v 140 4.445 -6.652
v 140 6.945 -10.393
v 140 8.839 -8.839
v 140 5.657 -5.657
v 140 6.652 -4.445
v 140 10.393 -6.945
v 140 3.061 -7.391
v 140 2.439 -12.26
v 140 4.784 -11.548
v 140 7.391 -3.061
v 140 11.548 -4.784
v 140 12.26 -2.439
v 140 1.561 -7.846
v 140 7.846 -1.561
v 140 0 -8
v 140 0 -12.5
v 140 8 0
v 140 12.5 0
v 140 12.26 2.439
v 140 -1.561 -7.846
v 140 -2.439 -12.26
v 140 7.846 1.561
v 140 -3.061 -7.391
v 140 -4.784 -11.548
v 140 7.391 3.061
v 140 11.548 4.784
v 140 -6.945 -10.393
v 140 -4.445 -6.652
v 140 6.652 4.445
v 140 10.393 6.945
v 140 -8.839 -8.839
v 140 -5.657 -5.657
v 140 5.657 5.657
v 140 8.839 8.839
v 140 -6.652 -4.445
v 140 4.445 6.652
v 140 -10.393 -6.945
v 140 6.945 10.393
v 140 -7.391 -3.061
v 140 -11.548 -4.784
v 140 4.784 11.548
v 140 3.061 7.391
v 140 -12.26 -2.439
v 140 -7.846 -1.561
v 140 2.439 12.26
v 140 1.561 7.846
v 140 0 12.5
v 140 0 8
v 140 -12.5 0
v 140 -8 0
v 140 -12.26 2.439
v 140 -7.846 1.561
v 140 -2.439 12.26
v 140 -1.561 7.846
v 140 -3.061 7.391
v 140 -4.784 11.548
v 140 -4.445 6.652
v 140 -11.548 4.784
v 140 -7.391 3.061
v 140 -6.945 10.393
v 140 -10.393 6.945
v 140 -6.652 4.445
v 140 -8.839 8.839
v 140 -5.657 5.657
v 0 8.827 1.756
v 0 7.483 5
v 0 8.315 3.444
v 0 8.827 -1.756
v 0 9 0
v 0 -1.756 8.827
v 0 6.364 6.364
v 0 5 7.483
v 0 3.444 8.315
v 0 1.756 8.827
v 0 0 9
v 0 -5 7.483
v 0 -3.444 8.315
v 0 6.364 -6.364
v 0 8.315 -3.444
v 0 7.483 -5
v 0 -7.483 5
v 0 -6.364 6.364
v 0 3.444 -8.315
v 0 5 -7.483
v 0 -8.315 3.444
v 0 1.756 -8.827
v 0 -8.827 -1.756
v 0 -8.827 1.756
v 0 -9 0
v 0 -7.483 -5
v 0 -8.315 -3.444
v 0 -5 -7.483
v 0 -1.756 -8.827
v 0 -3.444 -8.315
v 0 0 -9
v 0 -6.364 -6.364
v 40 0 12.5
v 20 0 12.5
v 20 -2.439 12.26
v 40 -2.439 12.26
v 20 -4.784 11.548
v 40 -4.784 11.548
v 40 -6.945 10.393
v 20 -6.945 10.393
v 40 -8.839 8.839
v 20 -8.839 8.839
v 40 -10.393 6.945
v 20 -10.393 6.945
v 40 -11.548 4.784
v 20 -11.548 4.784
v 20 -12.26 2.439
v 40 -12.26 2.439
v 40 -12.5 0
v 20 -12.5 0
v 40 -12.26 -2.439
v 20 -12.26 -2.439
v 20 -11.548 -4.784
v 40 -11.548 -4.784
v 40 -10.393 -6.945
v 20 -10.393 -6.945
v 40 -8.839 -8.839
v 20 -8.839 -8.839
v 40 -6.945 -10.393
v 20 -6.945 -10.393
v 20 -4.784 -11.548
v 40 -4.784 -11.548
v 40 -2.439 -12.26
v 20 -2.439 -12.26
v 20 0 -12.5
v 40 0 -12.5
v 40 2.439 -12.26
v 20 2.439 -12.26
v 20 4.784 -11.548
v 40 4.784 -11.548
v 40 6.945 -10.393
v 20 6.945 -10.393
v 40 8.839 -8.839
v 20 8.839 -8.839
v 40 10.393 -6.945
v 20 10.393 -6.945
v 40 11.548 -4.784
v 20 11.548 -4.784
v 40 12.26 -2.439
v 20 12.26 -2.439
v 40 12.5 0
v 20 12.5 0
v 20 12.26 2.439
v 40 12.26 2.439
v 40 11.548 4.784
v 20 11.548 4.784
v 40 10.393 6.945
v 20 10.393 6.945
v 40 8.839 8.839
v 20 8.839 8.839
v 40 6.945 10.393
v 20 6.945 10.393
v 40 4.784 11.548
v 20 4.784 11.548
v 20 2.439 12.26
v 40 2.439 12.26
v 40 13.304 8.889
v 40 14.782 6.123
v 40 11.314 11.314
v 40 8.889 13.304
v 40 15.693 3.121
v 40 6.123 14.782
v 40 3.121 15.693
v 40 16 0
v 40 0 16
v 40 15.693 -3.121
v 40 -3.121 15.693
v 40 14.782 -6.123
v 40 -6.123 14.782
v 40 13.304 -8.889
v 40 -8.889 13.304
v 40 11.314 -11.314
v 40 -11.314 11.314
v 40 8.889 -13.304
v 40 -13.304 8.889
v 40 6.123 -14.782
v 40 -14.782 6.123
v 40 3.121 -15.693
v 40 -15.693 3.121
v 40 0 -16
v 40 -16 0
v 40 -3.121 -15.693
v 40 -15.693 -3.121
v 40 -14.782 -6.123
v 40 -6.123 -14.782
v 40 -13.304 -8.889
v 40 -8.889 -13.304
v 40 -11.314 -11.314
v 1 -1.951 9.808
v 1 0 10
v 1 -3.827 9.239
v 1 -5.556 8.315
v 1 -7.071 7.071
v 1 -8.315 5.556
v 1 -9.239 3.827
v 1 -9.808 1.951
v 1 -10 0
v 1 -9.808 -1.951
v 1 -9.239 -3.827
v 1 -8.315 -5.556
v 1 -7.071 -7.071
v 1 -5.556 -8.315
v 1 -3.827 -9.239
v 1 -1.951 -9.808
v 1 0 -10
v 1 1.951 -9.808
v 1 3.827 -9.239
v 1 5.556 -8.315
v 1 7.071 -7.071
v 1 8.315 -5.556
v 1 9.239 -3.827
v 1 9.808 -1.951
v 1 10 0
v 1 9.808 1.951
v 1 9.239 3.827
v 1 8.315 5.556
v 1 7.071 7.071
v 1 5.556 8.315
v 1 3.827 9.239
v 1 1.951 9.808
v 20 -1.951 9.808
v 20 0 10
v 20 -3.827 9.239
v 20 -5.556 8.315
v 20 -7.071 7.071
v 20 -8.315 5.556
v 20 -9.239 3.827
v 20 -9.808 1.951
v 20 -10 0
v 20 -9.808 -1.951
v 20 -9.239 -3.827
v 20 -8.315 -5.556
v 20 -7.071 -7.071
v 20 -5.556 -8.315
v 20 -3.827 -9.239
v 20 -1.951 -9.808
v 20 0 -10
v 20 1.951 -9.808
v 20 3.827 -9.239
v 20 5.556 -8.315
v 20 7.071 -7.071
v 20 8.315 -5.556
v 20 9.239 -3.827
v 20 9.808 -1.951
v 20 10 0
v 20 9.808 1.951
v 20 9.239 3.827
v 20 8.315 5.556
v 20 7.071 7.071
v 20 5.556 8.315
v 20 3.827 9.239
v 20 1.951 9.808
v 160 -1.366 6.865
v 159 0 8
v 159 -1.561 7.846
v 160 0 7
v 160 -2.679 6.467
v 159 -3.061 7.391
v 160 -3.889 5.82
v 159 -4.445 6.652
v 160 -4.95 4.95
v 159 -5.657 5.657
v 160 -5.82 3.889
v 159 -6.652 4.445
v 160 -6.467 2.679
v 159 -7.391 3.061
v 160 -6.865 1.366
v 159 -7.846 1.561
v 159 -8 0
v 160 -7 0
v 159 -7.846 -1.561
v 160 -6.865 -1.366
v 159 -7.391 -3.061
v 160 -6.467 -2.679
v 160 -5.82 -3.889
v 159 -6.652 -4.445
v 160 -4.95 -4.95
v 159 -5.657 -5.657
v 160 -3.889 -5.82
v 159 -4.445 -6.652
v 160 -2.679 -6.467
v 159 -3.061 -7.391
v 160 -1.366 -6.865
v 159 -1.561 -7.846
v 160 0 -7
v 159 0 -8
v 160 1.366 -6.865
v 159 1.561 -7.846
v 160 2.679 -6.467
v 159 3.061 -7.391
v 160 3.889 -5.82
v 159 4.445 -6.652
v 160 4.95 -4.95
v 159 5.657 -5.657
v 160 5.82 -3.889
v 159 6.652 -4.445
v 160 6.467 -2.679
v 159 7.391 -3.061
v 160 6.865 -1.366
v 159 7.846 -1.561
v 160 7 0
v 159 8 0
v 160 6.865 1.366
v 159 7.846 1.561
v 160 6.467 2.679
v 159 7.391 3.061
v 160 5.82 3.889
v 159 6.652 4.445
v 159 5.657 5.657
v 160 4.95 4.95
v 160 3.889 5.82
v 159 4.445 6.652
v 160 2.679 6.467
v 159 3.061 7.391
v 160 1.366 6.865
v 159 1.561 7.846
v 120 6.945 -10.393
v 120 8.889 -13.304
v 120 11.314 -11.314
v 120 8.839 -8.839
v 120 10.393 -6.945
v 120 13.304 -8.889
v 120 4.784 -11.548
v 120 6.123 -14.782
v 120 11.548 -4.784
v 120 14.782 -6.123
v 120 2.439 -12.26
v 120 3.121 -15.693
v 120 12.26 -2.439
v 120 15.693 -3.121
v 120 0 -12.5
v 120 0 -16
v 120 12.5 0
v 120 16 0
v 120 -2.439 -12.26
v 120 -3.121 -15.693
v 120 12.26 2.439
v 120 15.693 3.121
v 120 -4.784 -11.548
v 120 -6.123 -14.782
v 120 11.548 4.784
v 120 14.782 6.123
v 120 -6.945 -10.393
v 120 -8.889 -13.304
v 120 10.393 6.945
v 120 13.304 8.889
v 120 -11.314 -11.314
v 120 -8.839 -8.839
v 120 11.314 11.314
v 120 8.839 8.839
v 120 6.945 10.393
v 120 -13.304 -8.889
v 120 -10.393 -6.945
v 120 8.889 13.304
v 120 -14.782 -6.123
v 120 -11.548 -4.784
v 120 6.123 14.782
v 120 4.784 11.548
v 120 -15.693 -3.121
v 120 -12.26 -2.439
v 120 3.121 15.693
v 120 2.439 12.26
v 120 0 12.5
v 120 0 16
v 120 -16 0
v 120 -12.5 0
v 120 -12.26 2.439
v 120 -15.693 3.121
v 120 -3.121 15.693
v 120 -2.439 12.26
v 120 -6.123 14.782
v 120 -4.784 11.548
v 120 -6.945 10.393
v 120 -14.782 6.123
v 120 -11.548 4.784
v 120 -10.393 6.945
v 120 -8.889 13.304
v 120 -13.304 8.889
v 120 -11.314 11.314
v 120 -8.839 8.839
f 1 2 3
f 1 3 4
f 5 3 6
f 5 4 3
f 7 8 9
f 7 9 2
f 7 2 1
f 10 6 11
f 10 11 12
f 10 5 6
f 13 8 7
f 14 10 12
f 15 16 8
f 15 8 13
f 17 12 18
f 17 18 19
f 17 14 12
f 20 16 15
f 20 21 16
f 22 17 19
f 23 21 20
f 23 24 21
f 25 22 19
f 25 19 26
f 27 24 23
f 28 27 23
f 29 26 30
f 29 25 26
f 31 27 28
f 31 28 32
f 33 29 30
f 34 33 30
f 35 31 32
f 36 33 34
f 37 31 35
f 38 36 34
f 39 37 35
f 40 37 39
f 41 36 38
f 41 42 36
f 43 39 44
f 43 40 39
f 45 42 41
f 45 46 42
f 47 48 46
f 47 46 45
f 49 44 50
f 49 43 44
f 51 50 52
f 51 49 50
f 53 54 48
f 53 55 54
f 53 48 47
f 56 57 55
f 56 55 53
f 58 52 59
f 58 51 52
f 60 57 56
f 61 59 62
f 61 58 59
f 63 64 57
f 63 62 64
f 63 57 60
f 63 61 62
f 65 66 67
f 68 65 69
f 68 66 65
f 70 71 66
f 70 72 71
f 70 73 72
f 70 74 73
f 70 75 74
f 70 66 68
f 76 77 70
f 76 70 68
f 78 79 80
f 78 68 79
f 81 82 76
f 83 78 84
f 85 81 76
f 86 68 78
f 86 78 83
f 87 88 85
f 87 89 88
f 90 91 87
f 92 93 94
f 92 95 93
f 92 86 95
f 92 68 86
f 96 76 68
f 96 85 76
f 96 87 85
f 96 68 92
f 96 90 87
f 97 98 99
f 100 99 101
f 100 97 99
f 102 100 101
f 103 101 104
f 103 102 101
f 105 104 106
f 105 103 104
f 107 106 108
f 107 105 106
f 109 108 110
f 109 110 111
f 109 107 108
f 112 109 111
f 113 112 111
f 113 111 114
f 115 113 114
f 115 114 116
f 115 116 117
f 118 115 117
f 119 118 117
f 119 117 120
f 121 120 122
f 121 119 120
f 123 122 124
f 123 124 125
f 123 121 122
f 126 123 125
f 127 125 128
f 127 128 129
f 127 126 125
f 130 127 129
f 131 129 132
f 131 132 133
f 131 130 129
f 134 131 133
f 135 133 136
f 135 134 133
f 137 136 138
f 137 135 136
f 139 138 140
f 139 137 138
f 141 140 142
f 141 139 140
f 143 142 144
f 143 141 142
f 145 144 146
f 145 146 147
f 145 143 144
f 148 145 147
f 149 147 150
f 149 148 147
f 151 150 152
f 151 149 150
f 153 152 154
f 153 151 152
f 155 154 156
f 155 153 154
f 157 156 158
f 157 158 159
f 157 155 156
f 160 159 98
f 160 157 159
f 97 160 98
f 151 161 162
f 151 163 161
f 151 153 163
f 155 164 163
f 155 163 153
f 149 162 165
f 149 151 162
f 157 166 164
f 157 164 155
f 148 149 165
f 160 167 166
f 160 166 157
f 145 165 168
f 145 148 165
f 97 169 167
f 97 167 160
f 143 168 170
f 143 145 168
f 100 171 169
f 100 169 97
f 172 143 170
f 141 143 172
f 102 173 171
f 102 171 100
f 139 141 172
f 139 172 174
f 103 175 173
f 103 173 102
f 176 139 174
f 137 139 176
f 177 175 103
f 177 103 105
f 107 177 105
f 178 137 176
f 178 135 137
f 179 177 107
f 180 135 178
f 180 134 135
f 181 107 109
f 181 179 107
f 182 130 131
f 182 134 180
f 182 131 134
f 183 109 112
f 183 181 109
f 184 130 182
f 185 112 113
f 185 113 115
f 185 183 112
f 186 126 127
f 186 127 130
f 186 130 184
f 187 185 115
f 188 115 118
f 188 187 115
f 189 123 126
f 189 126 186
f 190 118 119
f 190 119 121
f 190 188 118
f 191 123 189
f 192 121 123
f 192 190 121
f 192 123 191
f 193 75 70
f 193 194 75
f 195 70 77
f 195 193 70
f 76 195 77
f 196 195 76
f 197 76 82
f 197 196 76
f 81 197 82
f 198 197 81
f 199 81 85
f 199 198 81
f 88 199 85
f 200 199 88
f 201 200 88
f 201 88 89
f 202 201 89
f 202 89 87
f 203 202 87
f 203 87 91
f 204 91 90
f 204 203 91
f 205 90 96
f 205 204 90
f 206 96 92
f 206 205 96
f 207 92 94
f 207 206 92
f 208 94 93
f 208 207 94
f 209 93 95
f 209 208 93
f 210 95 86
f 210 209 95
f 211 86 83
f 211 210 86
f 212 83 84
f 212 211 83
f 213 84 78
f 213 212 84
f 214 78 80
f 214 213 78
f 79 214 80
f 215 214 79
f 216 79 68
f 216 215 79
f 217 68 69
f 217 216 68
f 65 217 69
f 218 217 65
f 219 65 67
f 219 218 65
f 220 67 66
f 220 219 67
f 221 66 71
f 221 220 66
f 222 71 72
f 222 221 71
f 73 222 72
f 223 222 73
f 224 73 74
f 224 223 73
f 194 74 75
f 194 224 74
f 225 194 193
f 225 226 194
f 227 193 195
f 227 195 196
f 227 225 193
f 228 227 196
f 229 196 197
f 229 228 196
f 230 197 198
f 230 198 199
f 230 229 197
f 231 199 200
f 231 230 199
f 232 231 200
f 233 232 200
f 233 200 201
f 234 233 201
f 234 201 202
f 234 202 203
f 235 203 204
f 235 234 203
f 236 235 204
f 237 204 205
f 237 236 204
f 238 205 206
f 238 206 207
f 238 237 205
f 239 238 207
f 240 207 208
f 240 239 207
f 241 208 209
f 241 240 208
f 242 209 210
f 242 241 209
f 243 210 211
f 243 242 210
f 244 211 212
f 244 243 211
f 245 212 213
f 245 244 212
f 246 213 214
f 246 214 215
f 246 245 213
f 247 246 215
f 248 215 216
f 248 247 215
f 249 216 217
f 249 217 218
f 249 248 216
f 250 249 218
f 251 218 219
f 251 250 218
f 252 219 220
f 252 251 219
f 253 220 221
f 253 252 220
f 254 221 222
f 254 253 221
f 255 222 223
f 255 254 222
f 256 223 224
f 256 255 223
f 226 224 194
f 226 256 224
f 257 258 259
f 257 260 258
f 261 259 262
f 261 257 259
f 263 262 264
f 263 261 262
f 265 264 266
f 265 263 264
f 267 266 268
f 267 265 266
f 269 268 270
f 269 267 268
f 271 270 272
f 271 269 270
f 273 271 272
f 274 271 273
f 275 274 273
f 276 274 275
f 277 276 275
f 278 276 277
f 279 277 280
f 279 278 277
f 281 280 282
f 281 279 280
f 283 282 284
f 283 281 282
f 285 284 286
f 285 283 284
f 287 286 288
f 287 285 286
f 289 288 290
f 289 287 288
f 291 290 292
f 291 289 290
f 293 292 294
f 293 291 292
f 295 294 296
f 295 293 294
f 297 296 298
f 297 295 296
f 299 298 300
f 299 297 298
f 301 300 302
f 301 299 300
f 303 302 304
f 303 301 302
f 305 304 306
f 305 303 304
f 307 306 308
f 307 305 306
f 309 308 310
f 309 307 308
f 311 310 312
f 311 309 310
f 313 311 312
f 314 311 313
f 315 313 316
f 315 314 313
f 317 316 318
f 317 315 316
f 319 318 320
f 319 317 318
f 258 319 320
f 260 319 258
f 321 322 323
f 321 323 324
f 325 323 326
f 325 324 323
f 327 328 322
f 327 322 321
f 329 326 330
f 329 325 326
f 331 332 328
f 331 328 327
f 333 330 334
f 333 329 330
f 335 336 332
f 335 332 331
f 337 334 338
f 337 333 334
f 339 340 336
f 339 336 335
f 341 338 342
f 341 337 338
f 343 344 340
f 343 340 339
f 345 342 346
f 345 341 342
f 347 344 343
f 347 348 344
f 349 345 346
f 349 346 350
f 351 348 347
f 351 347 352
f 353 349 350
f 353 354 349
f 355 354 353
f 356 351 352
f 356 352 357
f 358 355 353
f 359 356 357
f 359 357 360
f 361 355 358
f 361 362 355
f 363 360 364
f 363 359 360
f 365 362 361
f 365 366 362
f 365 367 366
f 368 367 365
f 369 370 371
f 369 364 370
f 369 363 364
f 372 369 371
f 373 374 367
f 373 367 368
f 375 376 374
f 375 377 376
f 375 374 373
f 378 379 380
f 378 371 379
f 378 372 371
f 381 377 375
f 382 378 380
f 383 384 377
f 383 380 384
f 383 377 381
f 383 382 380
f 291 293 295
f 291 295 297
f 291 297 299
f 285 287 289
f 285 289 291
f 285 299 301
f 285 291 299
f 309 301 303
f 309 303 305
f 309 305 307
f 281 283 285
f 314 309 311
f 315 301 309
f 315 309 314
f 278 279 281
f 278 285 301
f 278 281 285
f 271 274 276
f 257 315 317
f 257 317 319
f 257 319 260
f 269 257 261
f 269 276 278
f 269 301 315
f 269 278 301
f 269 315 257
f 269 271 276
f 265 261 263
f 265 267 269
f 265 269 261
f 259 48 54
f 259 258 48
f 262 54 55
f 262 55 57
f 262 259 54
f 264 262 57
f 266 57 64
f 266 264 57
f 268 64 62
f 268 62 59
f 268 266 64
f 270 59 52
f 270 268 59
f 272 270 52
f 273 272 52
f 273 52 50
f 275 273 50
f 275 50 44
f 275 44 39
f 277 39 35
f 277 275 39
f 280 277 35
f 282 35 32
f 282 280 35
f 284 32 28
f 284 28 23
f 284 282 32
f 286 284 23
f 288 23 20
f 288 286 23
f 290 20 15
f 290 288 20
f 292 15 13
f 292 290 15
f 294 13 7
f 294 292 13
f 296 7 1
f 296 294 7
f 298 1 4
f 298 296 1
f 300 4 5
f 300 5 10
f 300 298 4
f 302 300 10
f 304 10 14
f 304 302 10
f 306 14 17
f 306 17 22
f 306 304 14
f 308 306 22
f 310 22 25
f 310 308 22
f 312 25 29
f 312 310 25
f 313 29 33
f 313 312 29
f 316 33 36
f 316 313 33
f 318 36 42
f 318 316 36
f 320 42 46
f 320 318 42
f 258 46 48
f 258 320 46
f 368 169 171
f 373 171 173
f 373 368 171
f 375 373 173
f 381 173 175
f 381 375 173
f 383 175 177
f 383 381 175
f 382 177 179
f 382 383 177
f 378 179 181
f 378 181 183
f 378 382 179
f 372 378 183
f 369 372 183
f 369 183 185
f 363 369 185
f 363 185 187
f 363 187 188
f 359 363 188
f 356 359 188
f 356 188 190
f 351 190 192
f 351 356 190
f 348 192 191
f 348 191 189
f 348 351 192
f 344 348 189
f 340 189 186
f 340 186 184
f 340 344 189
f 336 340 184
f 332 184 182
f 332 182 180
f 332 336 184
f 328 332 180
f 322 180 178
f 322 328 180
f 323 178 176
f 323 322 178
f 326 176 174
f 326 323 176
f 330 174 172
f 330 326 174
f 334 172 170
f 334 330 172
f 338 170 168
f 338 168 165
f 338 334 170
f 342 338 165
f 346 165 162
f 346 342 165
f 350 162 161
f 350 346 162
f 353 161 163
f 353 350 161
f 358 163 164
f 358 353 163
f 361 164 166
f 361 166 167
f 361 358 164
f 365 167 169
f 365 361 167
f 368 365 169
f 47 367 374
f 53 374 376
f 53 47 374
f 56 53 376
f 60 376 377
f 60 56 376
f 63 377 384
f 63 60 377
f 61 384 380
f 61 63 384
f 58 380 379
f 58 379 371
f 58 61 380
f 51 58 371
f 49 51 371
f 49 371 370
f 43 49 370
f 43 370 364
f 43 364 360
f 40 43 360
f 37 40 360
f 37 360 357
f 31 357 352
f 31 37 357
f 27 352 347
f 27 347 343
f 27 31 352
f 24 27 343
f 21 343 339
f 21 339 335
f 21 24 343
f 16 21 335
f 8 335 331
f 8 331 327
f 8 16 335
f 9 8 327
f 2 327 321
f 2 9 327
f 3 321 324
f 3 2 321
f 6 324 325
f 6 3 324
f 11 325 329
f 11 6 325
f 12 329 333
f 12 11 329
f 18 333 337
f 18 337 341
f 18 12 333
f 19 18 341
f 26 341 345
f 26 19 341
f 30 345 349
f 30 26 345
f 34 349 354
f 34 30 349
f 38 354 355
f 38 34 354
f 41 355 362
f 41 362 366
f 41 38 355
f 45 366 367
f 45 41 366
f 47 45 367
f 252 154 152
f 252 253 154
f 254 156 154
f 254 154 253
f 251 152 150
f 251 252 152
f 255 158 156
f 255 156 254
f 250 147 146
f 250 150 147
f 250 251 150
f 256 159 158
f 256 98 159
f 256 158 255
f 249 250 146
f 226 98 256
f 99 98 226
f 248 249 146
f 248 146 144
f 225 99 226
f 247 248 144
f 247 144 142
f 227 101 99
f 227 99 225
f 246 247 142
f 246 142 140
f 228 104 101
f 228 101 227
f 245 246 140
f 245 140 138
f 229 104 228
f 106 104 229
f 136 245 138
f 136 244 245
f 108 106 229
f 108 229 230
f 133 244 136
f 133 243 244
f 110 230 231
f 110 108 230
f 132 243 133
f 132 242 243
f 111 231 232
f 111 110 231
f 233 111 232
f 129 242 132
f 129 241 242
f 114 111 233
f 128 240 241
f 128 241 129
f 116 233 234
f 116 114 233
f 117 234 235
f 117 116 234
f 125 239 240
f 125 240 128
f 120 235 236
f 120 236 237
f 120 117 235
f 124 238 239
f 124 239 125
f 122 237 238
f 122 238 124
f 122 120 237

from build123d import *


with BuildPart() as part:
    # Skizze1 → Welle (revolve)
    with BuildSketch(Plane.XY, mode=Mode.PRIVATE) as welle_sk:
        Polygon((0, 0), (0, 9), (1, 10), (20, 10), (20, 12.5), (40, 12.5), (40, 16), (120, 16), (120, 12.5), (140, 12.5), (140, 8), (159, 8), (160, 7), (160, 0), align=None)
    revolve(welle_sk.sketch.rotate(Axis((-5, 0, 0), (1, 0, 0)), 90), axis=Axis((-5, 0, 0), (1, 0, 0)))


solid = part.part
